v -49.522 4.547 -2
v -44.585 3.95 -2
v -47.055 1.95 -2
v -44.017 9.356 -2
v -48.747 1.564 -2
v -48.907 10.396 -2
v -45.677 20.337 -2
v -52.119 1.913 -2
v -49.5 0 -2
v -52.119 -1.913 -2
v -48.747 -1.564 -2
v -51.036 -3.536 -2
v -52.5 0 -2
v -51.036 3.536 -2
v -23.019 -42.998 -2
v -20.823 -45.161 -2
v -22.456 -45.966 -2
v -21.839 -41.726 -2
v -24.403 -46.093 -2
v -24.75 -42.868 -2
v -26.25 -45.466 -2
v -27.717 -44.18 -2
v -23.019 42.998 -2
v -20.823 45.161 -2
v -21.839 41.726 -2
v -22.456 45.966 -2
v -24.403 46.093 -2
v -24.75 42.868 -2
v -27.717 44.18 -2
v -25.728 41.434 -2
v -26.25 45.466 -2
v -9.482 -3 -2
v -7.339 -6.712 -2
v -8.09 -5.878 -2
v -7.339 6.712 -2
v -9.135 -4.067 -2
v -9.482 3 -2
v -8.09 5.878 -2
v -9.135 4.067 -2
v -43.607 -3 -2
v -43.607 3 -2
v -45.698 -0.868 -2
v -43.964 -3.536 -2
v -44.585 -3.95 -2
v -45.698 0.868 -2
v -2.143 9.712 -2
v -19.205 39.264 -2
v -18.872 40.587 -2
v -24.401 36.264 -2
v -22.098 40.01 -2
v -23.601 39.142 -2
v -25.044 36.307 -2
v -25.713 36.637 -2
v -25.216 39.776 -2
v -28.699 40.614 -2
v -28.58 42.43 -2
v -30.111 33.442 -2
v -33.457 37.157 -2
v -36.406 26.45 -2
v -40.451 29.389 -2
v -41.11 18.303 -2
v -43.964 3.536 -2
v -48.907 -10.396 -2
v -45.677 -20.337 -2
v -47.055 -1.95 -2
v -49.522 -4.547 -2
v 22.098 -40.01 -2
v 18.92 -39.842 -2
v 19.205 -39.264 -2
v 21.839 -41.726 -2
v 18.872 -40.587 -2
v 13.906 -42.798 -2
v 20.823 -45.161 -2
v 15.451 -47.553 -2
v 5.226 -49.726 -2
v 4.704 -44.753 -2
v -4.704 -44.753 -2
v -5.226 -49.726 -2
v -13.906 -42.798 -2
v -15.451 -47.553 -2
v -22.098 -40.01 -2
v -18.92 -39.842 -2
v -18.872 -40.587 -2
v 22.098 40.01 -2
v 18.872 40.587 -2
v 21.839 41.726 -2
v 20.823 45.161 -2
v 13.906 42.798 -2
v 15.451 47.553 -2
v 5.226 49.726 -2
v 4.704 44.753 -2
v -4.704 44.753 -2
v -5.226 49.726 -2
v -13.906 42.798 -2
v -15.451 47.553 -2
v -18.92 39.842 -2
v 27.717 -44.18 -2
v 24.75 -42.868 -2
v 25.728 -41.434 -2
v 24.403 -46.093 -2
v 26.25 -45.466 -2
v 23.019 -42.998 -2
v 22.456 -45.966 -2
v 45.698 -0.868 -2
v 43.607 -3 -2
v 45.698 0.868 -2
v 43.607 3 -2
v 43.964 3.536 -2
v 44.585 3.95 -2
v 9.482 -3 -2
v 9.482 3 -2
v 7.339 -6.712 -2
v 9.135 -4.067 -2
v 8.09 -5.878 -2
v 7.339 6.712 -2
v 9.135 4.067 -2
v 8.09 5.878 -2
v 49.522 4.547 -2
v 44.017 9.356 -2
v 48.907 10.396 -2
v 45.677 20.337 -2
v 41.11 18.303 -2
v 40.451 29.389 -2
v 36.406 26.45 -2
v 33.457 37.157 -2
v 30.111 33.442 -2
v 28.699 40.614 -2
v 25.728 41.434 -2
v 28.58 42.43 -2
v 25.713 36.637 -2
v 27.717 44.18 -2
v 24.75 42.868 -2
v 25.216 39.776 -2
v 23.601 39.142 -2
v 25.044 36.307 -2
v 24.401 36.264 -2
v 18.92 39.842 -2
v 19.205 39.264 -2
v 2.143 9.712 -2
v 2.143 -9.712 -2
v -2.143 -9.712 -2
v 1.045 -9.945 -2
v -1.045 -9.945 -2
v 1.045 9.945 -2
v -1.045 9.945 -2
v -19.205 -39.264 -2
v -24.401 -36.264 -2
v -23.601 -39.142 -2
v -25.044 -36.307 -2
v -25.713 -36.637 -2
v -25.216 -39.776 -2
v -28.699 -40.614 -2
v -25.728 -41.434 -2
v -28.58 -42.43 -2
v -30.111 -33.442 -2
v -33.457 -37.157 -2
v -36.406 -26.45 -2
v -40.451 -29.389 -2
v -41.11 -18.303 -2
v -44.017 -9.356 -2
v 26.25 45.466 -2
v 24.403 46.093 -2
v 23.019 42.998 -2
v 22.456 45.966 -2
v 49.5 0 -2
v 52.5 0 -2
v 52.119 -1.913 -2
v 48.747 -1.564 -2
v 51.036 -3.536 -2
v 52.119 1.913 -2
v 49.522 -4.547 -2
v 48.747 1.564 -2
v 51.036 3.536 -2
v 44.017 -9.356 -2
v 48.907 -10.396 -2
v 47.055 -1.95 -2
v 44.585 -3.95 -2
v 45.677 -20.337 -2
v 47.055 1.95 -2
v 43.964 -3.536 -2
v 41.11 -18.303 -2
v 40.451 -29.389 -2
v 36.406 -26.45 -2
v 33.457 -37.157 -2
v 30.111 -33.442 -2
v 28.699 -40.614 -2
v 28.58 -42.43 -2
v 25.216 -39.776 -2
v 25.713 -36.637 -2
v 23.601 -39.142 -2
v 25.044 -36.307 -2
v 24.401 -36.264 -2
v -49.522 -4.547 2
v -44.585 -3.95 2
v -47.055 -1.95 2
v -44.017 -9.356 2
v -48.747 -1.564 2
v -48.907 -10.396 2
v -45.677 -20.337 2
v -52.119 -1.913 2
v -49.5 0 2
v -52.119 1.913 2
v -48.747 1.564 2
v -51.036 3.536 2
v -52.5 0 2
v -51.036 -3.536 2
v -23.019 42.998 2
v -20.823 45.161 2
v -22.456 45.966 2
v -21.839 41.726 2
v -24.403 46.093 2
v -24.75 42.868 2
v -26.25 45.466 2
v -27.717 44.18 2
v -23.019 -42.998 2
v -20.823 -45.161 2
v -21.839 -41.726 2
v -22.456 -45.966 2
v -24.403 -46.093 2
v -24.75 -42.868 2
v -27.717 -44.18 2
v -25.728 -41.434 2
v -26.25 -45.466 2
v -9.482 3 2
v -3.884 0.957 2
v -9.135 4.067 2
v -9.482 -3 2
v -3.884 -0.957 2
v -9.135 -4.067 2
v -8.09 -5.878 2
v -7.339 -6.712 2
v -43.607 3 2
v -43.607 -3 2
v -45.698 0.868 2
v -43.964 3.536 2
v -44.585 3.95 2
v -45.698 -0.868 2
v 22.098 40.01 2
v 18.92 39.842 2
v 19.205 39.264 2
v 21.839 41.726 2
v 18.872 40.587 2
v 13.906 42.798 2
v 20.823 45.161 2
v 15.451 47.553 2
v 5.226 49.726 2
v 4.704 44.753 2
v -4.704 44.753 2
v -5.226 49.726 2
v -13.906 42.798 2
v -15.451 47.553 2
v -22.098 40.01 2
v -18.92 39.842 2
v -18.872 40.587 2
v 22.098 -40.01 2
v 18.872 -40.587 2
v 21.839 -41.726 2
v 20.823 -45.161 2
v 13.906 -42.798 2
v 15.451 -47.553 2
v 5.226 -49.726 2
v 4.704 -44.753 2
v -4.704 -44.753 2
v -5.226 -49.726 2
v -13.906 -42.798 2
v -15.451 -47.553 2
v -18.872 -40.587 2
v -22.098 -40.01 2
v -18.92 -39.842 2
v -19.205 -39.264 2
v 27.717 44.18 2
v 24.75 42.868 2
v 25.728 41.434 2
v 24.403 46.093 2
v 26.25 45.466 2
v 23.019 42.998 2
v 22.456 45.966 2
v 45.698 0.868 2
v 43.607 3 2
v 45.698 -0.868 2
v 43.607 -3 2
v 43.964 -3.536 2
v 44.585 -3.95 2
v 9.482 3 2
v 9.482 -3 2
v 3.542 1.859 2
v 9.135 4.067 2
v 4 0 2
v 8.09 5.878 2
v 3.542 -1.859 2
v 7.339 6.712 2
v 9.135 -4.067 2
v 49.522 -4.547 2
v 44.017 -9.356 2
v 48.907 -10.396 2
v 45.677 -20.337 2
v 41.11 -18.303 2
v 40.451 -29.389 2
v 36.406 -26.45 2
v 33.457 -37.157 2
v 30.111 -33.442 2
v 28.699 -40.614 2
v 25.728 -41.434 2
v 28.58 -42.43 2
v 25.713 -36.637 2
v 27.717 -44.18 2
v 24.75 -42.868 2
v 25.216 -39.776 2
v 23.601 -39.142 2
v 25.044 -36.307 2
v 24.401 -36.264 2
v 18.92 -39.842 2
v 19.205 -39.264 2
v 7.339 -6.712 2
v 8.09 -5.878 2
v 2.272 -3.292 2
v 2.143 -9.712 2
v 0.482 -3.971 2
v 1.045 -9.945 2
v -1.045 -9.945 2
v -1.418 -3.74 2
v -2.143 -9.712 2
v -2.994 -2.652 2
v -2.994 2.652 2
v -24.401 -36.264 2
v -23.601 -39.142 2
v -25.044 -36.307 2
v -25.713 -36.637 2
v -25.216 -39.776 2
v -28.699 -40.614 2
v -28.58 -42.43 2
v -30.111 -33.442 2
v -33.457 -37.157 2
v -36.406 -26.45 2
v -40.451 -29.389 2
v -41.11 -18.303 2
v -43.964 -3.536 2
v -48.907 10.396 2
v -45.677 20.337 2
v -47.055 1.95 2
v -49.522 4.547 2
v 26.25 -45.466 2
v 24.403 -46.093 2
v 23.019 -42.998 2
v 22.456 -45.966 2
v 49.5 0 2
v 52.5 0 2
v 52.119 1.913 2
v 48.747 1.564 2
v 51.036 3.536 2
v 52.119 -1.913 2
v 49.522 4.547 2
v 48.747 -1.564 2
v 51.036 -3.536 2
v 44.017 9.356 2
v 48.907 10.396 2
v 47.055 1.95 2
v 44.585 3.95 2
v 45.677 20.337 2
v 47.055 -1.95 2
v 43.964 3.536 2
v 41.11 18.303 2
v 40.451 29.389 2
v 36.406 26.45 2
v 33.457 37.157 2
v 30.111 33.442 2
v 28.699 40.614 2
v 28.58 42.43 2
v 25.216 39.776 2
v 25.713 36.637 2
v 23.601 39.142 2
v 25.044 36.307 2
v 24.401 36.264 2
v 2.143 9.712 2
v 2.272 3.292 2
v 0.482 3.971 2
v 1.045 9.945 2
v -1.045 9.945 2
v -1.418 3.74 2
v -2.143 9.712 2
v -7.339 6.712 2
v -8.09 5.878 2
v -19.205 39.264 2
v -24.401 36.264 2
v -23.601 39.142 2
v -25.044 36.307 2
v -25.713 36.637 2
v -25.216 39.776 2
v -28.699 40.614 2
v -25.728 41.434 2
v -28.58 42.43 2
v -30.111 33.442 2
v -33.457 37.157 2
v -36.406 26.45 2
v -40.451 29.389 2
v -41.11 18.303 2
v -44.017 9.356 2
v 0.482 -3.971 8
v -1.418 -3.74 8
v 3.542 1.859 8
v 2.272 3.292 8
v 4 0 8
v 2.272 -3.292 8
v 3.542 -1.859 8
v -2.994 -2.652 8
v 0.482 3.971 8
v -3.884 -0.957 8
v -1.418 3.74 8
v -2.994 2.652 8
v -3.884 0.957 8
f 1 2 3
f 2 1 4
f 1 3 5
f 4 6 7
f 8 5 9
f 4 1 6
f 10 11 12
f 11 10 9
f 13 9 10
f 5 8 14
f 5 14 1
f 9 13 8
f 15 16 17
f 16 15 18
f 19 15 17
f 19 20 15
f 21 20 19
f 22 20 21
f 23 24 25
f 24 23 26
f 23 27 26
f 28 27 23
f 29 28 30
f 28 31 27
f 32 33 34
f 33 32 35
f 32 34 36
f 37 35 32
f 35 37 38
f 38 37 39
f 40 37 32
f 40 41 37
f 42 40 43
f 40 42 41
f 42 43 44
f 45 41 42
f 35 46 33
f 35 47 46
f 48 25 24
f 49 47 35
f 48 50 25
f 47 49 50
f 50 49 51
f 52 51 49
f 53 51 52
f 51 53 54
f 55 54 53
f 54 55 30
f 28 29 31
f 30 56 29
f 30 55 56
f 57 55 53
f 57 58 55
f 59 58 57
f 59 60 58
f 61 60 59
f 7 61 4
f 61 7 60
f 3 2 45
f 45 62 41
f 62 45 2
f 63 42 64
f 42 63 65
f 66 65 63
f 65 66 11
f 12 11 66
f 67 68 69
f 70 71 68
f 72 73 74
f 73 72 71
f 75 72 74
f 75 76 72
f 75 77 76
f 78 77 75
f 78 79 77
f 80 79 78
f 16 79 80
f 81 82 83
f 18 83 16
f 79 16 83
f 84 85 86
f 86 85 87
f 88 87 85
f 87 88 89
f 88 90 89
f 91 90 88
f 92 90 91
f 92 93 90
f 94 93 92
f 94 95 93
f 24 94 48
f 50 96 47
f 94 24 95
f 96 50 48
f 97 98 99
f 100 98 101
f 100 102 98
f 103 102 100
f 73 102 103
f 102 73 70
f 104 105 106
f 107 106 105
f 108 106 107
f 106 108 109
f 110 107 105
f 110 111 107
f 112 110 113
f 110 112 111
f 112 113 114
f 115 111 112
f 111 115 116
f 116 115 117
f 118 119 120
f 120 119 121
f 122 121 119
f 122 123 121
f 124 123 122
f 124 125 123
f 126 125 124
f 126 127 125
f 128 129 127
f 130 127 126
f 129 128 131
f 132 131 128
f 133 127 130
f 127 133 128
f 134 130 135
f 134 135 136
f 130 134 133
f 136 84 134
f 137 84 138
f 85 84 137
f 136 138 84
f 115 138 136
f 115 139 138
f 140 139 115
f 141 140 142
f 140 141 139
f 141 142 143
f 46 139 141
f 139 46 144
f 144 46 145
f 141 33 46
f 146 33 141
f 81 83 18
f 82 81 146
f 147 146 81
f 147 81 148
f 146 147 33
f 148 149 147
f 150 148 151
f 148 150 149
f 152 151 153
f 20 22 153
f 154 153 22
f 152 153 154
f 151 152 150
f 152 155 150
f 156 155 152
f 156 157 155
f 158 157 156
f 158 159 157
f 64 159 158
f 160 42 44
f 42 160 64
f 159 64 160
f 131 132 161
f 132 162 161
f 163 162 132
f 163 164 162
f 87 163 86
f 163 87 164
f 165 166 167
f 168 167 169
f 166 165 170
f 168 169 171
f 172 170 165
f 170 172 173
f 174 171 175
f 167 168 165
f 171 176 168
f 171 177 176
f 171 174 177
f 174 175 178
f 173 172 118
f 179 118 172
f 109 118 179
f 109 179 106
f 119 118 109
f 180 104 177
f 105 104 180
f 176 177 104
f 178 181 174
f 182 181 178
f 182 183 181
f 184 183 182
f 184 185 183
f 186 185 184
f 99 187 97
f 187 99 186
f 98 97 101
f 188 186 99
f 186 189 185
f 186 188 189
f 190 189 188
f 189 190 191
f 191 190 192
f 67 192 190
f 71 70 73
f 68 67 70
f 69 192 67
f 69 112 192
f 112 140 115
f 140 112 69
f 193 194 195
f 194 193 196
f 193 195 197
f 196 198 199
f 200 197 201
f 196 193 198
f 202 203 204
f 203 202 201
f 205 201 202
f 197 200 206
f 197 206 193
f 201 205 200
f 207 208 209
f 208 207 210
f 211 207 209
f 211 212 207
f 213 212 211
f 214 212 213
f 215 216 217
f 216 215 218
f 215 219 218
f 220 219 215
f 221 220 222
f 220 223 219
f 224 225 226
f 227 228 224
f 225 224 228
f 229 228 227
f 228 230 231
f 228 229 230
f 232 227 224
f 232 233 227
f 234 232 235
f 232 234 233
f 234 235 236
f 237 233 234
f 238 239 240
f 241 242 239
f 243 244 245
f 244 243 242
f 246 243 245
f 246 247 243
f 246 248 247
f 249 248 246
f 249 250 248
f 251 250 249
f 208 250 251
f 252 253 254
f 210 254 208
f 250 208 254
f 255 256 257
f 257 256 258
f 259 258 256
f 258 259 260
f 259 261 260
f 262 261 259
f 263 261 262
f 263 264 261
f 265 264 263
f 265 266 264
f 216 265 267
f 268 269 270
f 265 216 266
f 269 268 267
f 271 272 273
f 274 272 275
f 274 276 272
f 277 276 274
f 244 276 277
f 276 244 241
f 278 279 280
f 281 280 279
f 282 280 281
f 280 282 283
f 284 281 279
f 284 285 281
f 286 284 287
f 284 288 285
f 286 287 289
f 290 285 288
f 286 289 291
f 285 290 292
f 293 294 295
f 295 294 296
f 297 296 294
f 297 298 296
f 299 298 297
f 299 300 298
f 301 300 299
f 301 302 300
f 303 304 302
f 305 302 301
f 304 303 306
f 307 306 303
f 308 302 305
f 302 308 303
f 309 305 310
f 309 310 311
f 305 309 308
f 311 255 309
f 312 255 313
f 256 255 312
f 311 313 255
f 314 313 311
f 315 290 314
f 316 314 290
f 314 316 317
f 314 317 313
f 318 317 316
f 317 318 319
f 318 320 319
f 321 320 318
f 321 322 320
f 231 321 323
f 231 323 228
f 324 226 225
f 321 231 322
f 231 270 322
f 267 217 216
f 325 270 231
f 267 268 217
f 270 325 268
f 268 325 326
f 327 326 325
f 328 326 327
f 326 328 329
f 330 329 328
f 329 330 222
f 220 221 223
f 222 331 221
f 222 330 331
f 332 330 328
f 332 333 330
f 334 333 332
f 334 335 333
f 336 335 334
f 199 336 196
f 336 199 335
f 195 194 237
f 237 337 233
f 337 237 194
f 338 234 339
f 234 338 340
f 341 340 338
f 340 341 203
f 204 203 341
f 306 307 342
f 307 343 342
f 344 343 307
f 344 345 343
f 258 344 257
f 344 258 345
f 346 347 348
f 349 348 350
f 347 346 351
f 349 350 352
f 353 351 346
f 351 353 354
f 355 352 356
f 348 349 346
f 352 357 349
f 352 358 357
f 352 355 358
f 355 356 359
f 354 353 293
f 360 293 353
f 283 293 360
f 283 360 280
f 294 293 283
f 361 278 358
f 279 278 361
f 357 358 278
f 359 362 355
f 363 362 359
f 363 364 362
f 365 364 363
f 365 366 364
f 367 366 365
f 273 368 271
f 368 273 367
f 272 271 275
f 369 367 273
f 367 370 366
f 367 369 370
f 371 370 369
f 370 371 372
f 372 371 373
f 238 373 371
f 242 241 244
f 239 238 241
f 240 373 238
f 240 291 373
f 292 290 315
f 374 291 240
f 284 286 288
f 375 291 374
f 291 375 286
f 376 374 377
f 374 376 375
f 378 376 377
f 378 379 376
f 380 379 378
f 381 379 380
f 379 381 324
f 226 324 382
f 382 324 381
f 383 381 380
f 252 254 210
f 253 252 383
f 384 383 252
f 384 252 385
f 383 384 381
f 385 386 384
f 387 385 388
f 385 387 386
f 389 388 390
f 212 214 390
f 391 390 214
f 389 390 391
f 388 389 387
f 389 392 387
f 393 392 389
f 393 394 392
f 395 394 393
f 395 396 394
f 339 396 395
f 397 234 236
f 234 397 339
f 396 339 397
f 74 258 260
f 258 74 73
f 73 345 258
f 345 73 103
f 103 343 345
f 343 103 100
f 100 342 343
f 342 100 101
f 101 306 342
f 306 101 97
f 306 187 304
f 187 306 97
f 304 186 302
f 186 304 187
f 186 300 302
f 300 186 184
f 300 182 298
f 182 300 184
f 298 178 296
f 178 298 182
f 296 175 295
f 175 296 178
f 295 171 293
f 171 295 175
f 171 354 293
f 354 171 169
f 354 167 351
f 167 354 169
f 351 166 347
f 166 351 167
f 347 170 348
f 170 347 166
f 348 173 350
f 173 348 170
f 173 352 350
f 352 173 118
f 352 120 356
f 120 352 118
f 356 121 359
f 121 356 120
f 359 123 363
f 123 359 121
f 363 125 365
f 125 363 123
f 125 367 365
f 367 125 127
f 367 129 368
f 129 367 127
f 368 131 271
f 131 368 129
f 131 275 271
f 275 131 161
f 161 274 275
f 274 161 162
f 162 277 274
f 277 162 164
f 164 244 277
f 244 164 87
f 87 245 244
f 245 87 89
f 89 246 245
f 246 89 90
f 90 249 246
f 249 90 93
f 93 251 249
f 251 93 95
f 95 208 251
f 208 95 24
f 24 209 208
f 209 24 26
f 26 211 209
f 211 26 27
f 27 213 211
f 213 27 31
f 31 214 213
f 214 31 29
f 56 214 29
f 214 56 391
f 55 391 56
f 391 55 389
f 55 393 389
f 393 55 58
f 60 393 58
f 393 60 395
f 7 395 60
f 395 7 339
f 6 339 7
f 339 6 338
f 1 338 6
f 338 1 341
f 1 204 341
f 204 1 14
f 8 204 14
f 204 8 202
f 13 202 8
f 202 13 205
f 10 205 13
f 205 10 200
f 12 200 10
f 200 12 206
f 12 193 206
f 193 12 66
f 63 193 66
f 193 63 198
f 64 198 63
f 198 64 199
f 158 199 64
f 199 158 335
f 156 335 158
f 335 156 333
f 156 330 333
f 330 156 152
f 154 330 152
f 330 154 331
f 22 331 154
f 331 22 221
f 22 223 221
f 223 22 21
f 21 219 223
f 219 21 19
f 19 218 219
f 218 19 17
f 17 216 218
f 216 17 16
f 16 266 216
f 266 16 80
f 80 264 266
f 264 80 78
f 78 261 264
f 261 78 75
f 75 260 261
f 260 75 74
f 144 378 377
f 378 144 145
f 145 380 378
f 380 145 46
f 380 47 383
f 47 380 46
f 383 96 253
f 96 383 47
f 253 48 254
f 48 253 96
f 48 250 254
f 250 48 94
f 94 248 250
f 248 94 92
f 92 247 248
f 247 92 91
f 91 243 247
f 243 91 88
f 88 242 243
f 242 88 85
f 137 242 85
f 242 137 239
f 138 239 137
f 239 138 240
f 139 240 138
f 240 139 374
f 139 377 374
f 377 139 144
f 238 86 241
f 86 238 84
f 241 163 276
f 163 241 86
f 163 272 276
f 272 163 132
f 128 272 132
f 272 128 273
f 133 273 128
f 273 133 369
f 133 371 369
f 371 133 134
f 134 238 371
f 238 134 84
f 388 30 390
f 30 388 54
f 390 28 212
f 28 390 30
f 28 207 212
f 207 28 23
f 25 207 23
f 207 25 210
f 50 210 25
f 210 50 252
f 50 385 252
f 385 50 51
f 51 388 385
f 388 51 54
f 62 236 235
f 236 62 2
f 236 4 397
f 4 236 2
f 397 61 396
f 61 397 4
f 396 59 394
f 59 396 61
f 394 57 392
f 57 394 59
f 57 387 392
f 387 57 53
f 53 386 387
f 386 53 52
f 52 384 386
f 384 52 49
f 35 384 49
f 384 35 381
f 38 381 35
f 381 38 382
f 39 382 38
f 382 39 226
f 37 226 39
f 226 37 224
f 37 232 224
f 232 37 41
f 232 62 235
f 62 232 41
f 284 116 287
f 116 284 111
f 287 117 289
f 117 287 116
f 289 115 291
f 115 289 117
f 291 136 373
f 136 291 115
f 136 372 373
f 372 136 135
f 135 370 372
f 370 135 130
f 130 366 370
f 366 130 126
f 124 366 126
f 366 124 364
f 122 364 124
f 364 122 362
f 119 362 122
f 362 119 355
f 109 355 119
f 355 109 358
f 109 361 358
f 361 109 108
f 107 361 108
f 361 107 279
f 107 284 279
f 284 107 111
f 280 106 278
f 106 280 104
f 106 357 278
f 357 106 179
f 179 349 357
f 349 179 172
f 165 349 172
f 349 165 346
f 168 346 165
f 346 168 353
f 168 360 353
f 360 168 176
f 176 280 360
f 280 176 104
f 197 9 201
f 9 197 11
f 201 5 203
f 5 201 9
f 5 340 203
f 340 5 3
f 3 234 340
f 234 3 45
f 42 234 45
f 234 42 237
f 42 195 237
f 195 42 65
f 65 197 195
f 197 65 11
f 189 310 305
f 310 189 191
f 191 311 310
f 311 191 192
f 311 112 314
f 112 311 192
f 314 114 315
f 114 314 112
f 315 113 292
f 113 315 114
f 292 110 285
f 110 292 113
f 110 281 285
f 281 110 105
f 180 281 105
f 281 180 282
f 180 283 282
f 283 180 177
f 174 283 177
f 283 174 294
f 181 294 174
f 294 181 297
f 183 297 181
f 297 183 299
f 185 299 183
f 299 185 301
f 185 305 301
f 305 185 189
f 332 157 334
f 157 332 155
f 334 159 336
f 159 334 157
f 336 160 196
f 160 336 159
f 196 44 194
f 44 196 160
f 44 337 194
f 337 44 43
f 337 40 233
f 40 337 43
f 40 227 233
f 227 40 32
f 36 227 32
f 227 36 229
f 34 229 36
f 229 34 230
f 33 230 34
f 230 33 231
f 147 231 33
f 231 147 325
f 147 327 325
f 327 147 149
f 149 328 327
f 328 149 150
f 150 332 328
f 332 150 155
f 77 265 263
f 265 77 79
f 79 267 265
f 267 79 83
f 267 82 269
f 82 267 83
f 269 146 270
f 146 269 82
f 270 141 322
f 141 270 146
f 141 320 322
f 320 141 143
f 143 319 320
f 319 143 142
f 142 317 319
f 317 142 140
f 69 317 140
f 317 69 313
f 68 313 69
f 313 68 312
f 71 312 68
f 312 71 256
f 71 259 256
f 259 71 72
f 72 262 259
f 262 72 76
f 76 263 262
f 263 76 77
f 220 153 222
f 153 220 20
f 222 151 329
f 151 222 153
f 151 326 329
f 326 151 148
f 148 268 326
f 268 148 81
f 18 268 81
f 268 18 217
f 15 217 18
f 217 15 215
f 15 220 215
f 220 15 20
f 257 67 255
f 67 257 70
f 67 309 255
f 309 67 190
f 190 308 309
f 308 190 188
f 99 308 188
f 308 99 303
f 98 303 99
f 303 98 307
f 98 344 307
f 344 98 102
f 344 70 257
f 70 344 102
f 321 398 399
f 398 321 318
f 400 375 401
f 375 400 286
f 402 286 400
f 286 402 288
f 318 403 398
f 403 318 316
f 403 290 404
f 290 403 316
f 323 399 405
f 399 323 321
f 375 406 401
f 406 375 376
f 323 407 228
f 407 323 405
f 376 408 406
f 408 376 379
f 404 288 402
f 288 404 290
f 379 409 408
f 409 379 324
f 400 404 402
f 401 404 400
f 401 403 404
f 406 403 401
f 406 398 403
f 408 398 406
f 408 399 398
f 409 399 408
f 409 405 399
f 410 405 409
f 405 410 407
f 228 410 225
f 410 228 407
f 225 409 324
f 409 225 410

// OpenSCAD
module pillar(width, height) {
    square([width, height], center=false);
}

module pillars(width, height){ 
    for (angle = [0:60:360])
        rotate([0,0,angle])
        translate([0,(-height / 2),0])
        pillar(width, height);
}

module outerRing(distanceToCenterRotationPoint) {
    outerRingDiameter = distanceToCenterRotationPoint + 5;
    difference(){
        circle(outerRingDiameter);        
        circle(distanceToCenterRotationPoint);    
    }
}

module innerRing(){
    innerRingDiameter = 10;
    circle(innerRingDiameter);  
}

module screws(distanceToCenterRotationPoint, outterRingDiameter, screwDiameter){
    screwRadiusToCenterRotationPoint = distanceToCenterRotationPoint + outterRingDiameter;
    
    for (angle = [0:60:360])
        rotate([0,0,angle])
        translate([screwRadiusToCenterRotationPoint,0,0])
        circle(screwDiameter);
}

module rearStator(){
    pillarWidth = 6;
    pillarHeight = 45;
    screwDiameter = 2;

    union(){
        difference(){
            // drill suport for screws
            union(){
                outerRing(pillarHeight); 
                screws(pillarHeight, 2.5, 5);
            }
            // drill holes for screws
            screws(pillarHeight, 2.5, screwDiameter);
        }
        pillars(pillarHeight, pillarWidth);
        innerRing();
    }
}

module ballBearingHandler(){
    diameter = 4;
    circle(diameter);       
}

linear_extrude(height = 4, center = true, convexity = 10, twist = 0)
    rearStator();

linear_extrude(height = 8, convexity = 10, twist = 0)
    ballBearingHandler();
